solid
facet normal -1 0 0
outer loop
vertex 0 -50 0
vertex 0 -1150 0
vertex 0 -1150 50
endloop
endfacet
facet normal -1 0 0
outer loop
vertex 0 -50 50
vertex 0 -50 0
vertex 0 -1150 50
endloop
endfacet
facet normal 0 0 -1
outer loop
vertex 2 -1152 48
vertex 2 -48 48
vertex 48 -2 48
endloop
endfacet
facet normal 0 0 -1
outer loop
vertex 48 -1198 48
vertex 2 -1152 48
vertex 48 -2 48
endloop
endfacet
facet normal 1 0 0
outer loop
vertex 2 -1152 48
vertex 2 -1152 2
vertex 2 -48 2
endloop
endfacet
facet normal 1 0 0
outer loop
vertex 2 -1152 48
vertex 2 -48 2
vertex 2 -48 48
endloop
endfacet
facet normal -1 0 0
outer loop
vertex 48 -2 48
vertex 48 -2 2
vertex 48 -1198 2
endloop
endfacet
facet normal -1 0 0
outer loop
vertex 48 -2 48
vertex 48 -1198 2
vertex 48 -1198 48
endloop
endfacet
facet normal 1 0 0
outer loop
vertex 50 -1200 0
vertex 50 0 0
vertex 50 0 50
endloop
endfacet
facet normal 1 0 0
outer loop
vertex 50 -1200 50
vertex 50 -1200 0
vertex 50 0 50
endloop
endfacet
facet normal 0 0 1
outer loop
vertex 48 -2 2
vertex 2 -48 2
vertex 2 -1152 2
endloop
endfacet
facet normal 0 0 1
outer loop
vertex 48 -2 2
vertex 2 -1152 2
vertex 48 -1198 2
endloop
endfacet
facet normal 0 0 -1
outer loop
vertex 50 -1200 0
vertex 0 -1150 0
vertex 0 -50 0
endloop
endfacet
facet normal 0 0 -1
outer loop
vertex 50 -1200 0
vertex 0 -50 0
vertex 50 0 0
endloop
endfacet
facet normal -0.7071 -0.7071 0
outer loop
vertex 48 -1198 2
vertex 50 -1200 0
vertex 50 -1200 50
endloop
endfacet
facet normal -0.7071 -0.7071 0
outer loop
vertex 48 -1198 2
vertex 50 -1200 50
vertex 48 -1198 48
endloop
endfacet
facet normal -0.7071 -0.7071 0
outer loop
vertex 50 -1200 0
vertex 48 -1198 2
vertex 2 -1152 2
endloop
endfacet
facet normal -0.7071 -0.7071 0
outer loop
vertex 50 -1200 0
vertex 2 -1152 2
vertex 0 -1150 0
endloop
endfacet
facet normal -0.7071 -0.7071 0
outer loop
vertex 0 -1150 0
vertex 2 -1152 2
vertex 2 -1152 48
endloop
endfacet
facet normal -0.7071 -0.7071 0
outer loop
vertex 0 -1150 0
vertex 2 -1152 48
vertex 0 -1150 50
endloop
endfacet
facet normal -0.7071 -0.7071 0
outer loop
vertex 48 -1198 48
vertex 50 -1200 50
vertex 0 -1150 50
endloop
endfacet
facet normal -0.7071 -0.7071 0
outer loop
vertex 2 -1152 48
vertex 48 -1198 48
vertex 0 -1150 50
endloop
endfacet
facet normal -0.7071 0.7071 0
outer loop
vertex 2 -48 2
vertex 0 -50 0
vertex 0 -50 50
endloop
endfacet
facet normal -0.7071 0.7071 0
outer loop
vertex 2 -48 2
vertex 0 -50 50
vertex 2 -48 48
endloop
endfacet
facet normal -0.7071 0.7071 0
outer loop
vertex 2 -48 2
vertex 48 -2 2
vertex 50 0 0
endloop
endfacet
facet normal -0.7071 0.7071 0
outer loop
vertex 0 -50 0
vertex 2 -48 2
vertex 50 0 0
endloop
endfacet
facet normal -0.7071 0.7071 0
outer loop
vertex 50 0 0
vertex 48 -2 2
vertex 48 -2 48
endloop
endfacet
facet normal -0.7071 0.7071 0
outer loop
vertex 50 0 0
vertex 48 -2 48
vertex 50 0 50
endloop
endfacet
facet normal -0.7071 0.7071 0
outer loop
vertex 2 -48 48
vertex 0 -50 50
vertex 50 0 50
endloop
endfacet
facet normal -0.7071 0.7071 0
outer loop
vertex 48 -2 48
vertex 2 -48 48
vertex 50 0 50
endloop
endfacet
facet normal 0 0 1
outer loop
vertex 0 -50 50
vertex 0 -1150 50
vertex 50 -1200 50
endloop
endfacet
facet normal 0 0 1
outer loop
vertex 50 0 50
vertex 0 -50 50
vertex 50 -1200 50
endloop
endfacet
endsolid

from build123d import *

# Parameters (mm, degrees)
F0_W     = 50
F0_H     = 50
F0_W_2   = 46
F0_H_2   = 46
F1_DEPTH = 1200
F3_DEPTH = 50
F4_DEPTH = 50


with BuildPart() as f1:
    # F0 (on Front) → F1 (new body)
    with BuildSketch(Plane.XZ):
        with Locations((25, 25)):
            Rectangle(F0_W, F0_H)
        with Locations((25, 25)):
            Rectangle(F0_W_2, F0_H_2, mode=Mode.SUBTRACT)
    extrude(amount=F1_DEPTH)

    # F2 (on face) → F3 (cut)
    with BuildSketch(Plane.XY.offset(50)):
        Polygon((50, 0), (0, 0), (0, -50), align=None)
    extrude(amount=-F3_DEPTH, mode=Mode.SUBTRACT)

    # F2 (on face) → F4 (cut)
    with BuildSketch(Plane.XY.offset(50)):
        Polygon((50, 0), (0, 0), (0, -50), align=None)
        Polygon((0, -1150), (0, -1200), (50, -1200), align=None)
    extrude(amount=-F4_DEPTH, mode=Mode.SUBTRACT)


solid = f1.part
